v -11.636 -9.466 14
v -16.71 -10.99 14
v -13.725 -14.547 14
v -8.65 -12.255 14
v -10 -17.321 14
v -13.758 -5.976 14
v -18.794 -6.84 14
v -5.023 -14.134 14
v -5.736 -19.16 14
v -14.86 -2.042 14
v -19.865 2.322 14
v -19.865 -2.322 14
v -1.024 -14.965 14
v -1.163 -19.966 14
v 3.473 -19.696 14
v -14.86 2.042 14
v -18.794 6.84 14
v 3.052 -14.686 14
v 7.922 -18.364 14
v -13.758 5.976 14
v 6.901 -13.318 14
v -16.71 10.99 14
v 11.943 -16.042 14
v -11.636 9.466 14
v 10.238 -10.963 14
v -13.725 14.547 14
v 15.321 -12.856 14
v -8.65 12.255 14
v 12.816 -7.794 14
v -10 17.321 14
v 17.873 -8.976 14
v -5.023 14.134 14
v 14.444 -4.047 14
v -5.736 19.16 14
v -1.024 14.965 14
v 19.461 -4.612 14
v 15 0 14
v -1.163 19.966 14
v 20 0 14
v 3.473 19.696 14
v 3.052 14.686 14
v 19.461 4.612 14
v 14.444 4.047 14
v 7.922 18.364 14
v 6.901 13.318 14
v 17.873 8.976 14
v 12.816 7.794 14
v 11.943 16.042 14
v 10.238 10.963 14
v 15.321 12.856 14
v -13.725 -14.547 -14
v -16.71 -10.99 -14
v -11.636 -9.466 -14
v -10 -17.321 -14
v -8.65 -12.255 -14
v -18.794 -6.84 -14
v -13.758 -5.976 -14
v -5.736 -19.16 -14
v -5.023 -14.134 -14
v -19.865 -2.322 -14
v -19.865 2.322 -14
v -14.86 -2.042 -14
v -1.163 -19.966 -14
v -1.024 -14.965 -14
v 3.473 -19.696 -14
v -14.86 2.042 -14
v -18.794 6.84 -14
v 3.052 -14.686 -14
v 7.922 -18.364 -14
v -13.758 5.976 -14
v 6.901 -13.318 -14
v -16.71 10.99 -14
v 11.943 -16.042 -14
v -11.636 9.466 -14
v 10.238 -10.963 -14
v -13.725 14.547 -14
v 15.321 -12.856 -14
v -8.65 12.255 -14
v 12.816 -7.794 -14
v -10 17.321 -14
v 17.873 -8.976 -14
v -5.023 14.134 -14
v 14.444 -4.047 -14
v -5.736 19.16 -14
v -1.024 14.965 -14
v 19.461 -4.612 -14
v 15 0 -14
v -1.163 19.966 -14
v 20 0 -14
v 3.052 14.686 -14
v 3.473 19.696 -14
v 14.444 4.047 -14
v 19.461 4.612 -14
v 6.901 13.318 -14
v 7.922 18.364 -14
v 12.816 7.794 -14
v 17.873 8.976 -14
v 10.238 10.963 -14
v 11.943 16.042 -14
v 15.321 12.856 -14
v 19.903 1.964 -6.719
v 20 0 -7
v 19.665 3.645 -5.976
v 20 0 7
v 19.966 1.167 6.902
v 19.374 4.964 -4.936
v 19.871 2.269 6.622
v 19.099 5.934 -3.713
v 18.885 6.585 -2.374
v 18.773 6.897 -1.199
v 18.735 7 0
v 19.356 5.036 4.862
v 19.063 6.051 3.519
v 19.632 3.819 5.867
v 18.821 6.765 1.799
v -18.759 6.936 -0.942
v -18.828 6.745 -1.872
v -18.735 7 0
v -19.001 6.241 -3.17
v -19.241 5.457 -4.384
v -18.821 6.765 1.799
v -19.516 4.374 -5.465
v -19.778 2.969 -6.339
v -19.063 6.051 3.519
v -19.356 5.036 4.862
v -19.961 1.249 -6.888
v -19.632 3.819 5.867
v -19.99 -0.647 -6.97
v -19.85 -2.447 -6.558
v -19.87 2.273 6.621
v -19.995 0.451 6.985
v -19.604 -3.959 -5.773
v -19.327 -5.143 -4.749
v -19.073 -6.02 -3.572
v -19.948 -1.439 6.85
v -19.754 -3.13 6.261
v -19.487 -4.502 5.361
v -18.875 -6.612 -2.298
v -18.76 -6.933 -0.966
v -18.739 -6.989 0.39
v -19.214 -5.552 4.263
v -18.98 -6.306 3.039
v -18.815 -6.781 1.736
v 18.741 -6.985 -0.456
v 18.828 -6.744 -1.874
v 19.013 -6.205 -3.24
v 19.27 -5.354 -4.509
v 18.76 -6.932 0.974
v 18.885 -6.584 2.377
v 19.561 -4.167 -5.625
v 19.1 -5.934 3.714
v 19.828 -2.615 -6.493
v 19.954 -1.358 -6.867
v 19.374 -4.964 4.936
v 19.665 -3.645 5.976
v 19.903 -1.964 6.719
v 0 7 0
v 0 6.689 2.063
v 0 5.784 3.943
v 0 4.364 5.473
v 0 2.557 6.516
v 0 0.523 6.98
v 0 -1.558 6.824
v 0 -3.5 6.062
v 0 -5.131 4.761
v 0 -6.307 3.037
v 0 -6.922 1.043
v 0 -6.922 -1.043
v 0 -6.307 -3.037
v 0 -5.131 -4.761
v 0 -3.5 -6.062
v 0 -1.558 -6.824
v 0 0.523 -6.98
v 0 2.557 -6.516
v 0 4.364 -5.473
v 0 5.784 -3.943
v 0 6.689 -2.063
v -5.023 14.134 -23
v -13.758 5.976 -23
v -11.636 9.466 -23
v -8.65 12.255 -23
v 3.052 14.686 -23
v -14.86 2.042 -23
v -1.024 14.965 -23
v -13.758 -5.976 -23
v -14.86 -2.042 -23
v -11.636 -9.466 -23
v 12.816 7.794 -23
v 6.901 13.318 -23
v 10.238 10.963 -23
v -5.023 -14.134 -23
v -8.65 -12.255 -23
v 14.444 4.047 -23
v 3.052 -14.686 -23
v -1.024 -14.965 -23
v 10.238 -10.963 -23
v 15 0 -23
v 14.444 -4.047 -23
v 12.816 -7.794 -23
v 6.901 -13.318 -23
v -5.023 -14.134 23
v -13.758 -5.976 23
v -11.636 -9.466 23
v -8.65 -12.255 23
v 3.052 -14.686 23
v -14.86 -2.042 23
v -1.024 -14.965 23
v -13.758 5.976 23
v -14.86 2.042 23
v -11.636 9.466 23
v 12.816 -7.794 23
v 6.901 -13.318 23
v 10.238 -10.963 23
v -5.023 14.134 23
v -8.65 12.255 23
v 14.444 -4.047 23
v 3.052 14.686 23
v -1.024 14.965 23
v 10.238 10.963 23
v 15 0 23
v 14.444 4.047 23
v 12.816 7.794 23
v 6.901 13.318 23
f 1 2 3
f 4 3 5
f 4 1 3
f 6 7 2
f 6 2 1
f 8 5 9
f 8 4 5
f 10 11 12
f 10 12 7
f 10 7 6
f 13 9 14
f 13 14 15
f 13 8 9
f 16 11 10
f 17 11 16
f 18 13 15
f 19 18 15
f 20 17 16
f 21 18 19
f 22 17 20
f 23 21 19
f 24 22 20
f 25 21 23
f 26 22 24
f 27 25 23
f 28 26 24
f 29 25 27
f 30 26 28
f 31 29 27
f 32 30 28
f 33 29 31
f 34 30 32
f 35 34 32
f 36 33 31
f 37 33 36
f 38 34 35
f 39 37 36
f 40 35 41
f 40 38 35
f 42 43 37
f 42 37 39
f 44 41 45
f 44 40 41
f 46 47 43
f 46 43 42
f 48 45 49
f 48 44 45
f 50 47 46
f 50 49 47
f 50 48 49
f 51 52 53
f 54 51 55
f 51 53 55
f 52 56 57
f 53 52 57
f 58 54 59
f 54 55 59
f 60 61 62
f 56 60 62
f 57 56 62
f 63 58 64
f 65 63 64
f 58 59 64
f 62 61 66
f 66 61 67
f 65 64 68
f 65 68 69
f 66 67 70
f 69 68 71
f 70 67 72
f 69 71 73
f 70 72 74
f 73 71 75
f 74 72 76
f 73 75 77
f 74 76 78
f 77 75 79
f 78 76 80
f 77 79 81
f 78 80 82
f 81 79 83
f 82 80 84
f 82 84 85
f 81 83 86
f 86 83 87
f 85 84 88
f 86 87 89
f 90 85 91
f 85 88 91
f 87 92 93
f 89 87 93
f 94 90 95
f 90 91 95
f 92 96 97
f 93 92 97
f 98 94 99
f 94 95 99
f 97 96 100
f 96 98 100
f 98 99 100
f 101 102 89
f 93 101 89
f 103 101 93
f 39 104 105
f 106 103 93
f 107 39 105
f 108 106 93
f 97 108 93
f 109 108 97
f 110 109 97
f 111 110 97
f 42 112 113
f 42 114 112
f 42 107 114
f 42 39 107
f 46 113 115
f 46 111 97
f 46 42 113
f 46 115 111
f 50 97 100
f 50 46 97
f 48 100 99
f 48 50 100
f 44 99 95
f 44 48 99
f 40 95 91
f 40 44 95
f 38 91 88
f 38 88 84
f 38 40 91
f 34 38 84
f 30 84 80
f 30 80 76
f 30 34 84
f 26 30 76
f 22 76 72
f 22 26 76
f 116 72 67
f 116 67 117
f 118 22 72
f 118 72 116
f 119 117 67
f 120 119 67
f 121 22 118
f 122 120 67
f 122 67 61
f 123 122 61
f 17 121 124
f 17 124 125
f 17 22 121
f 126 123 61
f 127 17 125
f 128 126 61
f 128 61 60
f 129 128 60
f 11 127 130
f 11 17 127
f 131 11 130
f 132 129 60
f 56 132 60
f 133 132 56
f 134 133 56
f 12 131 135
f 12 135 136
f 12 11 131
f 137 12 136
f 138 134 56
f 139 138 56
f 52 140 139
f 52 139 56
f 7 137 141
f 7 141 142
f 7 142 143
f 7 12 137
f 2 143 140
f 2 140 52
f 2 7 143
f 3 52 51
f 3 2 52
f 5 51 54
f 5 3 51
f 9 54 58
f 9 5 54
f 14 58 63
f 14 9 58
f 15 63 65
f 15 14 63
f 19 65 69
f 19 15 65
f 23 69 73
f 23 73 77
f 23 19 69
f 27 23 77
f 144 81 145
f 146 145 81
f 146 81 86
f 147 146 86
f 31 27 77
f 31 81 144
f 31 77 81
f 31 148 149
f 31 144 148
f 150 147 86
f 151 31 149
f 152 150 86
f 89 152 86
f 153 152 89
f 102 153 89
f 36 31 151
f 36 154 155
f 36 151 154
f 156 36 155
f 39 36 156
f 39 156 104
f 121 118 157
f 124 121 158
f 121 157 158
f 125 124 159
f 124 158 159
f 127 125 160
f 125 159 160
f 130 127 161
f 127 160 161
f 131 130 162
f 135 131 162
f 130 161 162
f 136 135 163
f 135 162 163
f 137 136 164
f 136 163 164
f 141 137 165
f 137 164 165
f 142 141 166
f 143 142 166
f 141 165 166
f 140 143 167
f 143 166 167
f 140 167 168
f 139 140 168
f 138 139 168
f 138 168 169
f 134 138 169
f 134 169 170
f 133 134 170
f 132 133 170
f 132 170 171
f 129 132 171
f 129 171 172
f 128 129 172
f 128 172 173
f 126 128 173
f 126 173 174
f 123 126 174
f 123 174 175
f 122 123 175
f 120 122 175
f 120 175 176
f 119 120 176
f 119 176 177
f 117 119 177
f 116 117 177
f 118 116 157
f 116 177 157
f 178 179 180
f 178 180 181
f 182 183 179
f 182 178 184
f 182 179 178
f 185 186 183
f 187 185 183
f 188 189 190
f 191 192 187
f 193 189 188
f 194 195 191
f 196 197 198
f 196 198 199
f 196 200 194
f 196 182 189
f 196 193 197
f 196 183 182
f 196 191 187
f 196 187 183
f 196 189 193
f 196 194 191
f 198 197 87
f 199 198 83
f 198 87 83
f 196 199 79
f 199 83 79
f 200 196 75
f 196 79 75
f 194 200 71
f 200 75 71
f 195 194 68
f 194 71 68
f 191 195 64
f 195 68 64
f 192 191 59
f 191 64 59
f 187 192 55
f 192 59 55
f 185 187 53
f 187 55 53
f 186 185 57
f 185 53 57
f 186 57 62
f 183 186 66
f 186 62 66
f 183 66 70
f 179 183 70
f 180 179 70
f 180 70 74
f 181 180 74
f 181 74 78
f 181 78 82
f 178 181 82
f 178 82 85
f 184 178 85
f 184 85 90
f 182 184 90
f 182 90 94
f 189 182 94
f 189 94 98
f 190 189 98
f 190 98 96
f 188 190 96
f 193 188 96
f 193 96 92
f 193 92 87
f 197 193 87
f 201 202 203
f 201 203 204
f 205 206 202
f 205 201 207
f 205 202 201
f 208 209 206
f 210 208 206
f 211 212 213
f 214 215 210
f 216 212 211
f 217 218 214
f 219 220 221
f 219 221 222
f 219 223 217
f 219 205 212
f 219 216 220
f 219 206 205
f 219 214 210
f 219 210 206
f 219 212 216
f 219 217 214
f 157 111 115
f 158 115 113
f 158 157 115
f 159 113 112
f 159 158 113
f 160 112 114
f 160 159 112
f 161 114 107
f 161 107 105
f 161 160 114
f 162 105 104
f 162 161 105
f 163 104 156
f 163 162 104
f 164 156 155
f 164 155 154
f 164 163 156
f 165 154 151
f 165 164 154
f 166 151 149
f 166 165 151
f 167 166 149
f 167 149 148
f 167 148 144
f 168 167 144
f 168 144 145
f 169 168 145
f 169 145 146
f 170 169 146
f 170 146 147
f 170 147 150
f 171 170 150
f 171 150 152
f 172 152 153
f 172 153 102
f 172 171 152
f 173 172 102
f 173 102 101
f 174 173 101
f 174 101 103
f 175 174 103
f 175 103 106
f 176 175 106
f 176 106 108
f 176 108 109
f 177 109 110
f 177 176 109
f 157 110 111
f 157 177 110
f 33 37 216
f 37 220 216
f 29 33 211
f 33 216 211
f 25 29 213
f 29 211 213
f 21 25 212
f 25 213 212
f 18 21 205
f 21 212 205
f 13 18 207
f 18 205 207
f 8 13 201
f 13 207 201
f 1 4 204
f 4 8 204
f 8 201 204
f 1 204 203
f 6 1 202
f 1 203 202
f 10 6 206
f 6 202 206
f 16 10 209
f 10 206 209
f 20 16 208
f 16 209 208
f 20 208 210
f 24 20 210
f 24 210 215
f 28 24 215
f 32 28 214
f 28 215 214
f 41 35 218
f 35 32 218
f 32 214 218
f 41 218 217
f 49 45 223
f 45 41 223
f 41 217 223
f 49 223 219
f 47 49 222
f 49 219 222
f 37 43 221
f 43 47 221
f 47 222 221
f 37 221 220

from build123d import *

# Parameters (mm, degrees)
F0_R          = 15
F1_DEPTH      = 18
F2_R          = 15
F3_DEPTH      = 5
F4_R          = 15
F5_DEPTH      = 5
F7_R          = 20
F8_DEPTH      = 14
F8_DEPTH_BACK = 14
F6_R          = 7
F9_DEPTH      = 20.001
F9_DEPTH_BACK = 20.001


with BuildPart() as f1:
    # F0 (on Top) → F1 (new body, symmetric)
    with BuildSketch(Plane.XY):
        Circle(F0_R)
    extrude(amount=F1_DEPTH, both=True)

    # F2 (on face) → F3 (join)
    with BuildSketch(Plane.XY.offset(18)):
        Circle(F2_R)
    extrude(amount=F3_DEPTH)

    # F4 (on face) → F5 (join)
    with BuildSketch(Plane(origin=(0, 0, -18), x_dir=(1, 0, 0), z_dir=(0, 0, -1))):
        Circle(F4_R)
    extrude(amount=F5_DEPTH)

    # F7 (on Top) → F8 (join, two sides)
    with BuildSketch(Plane.XY) as f8_sk:
        Circle(F7_R)
    extrude(amount=F8_DEPTH)
    extrude(f8_sk.sketch, amount=-F8_DEPTH_BACK)

    # F6 (on Right) → F9 (cut, two sides)
    with BuildSketch(Plane.YZ) as f9_sk:
        Circle(F6_R)
    extrude(amount=-F9_DEPTH, mode=Mode.SUBTRACT)
    extrude(f9_sk.sketch, amount=F9_DEPTH_BACK, mode=Mode.SUBTRACT)


solid = f1.part
